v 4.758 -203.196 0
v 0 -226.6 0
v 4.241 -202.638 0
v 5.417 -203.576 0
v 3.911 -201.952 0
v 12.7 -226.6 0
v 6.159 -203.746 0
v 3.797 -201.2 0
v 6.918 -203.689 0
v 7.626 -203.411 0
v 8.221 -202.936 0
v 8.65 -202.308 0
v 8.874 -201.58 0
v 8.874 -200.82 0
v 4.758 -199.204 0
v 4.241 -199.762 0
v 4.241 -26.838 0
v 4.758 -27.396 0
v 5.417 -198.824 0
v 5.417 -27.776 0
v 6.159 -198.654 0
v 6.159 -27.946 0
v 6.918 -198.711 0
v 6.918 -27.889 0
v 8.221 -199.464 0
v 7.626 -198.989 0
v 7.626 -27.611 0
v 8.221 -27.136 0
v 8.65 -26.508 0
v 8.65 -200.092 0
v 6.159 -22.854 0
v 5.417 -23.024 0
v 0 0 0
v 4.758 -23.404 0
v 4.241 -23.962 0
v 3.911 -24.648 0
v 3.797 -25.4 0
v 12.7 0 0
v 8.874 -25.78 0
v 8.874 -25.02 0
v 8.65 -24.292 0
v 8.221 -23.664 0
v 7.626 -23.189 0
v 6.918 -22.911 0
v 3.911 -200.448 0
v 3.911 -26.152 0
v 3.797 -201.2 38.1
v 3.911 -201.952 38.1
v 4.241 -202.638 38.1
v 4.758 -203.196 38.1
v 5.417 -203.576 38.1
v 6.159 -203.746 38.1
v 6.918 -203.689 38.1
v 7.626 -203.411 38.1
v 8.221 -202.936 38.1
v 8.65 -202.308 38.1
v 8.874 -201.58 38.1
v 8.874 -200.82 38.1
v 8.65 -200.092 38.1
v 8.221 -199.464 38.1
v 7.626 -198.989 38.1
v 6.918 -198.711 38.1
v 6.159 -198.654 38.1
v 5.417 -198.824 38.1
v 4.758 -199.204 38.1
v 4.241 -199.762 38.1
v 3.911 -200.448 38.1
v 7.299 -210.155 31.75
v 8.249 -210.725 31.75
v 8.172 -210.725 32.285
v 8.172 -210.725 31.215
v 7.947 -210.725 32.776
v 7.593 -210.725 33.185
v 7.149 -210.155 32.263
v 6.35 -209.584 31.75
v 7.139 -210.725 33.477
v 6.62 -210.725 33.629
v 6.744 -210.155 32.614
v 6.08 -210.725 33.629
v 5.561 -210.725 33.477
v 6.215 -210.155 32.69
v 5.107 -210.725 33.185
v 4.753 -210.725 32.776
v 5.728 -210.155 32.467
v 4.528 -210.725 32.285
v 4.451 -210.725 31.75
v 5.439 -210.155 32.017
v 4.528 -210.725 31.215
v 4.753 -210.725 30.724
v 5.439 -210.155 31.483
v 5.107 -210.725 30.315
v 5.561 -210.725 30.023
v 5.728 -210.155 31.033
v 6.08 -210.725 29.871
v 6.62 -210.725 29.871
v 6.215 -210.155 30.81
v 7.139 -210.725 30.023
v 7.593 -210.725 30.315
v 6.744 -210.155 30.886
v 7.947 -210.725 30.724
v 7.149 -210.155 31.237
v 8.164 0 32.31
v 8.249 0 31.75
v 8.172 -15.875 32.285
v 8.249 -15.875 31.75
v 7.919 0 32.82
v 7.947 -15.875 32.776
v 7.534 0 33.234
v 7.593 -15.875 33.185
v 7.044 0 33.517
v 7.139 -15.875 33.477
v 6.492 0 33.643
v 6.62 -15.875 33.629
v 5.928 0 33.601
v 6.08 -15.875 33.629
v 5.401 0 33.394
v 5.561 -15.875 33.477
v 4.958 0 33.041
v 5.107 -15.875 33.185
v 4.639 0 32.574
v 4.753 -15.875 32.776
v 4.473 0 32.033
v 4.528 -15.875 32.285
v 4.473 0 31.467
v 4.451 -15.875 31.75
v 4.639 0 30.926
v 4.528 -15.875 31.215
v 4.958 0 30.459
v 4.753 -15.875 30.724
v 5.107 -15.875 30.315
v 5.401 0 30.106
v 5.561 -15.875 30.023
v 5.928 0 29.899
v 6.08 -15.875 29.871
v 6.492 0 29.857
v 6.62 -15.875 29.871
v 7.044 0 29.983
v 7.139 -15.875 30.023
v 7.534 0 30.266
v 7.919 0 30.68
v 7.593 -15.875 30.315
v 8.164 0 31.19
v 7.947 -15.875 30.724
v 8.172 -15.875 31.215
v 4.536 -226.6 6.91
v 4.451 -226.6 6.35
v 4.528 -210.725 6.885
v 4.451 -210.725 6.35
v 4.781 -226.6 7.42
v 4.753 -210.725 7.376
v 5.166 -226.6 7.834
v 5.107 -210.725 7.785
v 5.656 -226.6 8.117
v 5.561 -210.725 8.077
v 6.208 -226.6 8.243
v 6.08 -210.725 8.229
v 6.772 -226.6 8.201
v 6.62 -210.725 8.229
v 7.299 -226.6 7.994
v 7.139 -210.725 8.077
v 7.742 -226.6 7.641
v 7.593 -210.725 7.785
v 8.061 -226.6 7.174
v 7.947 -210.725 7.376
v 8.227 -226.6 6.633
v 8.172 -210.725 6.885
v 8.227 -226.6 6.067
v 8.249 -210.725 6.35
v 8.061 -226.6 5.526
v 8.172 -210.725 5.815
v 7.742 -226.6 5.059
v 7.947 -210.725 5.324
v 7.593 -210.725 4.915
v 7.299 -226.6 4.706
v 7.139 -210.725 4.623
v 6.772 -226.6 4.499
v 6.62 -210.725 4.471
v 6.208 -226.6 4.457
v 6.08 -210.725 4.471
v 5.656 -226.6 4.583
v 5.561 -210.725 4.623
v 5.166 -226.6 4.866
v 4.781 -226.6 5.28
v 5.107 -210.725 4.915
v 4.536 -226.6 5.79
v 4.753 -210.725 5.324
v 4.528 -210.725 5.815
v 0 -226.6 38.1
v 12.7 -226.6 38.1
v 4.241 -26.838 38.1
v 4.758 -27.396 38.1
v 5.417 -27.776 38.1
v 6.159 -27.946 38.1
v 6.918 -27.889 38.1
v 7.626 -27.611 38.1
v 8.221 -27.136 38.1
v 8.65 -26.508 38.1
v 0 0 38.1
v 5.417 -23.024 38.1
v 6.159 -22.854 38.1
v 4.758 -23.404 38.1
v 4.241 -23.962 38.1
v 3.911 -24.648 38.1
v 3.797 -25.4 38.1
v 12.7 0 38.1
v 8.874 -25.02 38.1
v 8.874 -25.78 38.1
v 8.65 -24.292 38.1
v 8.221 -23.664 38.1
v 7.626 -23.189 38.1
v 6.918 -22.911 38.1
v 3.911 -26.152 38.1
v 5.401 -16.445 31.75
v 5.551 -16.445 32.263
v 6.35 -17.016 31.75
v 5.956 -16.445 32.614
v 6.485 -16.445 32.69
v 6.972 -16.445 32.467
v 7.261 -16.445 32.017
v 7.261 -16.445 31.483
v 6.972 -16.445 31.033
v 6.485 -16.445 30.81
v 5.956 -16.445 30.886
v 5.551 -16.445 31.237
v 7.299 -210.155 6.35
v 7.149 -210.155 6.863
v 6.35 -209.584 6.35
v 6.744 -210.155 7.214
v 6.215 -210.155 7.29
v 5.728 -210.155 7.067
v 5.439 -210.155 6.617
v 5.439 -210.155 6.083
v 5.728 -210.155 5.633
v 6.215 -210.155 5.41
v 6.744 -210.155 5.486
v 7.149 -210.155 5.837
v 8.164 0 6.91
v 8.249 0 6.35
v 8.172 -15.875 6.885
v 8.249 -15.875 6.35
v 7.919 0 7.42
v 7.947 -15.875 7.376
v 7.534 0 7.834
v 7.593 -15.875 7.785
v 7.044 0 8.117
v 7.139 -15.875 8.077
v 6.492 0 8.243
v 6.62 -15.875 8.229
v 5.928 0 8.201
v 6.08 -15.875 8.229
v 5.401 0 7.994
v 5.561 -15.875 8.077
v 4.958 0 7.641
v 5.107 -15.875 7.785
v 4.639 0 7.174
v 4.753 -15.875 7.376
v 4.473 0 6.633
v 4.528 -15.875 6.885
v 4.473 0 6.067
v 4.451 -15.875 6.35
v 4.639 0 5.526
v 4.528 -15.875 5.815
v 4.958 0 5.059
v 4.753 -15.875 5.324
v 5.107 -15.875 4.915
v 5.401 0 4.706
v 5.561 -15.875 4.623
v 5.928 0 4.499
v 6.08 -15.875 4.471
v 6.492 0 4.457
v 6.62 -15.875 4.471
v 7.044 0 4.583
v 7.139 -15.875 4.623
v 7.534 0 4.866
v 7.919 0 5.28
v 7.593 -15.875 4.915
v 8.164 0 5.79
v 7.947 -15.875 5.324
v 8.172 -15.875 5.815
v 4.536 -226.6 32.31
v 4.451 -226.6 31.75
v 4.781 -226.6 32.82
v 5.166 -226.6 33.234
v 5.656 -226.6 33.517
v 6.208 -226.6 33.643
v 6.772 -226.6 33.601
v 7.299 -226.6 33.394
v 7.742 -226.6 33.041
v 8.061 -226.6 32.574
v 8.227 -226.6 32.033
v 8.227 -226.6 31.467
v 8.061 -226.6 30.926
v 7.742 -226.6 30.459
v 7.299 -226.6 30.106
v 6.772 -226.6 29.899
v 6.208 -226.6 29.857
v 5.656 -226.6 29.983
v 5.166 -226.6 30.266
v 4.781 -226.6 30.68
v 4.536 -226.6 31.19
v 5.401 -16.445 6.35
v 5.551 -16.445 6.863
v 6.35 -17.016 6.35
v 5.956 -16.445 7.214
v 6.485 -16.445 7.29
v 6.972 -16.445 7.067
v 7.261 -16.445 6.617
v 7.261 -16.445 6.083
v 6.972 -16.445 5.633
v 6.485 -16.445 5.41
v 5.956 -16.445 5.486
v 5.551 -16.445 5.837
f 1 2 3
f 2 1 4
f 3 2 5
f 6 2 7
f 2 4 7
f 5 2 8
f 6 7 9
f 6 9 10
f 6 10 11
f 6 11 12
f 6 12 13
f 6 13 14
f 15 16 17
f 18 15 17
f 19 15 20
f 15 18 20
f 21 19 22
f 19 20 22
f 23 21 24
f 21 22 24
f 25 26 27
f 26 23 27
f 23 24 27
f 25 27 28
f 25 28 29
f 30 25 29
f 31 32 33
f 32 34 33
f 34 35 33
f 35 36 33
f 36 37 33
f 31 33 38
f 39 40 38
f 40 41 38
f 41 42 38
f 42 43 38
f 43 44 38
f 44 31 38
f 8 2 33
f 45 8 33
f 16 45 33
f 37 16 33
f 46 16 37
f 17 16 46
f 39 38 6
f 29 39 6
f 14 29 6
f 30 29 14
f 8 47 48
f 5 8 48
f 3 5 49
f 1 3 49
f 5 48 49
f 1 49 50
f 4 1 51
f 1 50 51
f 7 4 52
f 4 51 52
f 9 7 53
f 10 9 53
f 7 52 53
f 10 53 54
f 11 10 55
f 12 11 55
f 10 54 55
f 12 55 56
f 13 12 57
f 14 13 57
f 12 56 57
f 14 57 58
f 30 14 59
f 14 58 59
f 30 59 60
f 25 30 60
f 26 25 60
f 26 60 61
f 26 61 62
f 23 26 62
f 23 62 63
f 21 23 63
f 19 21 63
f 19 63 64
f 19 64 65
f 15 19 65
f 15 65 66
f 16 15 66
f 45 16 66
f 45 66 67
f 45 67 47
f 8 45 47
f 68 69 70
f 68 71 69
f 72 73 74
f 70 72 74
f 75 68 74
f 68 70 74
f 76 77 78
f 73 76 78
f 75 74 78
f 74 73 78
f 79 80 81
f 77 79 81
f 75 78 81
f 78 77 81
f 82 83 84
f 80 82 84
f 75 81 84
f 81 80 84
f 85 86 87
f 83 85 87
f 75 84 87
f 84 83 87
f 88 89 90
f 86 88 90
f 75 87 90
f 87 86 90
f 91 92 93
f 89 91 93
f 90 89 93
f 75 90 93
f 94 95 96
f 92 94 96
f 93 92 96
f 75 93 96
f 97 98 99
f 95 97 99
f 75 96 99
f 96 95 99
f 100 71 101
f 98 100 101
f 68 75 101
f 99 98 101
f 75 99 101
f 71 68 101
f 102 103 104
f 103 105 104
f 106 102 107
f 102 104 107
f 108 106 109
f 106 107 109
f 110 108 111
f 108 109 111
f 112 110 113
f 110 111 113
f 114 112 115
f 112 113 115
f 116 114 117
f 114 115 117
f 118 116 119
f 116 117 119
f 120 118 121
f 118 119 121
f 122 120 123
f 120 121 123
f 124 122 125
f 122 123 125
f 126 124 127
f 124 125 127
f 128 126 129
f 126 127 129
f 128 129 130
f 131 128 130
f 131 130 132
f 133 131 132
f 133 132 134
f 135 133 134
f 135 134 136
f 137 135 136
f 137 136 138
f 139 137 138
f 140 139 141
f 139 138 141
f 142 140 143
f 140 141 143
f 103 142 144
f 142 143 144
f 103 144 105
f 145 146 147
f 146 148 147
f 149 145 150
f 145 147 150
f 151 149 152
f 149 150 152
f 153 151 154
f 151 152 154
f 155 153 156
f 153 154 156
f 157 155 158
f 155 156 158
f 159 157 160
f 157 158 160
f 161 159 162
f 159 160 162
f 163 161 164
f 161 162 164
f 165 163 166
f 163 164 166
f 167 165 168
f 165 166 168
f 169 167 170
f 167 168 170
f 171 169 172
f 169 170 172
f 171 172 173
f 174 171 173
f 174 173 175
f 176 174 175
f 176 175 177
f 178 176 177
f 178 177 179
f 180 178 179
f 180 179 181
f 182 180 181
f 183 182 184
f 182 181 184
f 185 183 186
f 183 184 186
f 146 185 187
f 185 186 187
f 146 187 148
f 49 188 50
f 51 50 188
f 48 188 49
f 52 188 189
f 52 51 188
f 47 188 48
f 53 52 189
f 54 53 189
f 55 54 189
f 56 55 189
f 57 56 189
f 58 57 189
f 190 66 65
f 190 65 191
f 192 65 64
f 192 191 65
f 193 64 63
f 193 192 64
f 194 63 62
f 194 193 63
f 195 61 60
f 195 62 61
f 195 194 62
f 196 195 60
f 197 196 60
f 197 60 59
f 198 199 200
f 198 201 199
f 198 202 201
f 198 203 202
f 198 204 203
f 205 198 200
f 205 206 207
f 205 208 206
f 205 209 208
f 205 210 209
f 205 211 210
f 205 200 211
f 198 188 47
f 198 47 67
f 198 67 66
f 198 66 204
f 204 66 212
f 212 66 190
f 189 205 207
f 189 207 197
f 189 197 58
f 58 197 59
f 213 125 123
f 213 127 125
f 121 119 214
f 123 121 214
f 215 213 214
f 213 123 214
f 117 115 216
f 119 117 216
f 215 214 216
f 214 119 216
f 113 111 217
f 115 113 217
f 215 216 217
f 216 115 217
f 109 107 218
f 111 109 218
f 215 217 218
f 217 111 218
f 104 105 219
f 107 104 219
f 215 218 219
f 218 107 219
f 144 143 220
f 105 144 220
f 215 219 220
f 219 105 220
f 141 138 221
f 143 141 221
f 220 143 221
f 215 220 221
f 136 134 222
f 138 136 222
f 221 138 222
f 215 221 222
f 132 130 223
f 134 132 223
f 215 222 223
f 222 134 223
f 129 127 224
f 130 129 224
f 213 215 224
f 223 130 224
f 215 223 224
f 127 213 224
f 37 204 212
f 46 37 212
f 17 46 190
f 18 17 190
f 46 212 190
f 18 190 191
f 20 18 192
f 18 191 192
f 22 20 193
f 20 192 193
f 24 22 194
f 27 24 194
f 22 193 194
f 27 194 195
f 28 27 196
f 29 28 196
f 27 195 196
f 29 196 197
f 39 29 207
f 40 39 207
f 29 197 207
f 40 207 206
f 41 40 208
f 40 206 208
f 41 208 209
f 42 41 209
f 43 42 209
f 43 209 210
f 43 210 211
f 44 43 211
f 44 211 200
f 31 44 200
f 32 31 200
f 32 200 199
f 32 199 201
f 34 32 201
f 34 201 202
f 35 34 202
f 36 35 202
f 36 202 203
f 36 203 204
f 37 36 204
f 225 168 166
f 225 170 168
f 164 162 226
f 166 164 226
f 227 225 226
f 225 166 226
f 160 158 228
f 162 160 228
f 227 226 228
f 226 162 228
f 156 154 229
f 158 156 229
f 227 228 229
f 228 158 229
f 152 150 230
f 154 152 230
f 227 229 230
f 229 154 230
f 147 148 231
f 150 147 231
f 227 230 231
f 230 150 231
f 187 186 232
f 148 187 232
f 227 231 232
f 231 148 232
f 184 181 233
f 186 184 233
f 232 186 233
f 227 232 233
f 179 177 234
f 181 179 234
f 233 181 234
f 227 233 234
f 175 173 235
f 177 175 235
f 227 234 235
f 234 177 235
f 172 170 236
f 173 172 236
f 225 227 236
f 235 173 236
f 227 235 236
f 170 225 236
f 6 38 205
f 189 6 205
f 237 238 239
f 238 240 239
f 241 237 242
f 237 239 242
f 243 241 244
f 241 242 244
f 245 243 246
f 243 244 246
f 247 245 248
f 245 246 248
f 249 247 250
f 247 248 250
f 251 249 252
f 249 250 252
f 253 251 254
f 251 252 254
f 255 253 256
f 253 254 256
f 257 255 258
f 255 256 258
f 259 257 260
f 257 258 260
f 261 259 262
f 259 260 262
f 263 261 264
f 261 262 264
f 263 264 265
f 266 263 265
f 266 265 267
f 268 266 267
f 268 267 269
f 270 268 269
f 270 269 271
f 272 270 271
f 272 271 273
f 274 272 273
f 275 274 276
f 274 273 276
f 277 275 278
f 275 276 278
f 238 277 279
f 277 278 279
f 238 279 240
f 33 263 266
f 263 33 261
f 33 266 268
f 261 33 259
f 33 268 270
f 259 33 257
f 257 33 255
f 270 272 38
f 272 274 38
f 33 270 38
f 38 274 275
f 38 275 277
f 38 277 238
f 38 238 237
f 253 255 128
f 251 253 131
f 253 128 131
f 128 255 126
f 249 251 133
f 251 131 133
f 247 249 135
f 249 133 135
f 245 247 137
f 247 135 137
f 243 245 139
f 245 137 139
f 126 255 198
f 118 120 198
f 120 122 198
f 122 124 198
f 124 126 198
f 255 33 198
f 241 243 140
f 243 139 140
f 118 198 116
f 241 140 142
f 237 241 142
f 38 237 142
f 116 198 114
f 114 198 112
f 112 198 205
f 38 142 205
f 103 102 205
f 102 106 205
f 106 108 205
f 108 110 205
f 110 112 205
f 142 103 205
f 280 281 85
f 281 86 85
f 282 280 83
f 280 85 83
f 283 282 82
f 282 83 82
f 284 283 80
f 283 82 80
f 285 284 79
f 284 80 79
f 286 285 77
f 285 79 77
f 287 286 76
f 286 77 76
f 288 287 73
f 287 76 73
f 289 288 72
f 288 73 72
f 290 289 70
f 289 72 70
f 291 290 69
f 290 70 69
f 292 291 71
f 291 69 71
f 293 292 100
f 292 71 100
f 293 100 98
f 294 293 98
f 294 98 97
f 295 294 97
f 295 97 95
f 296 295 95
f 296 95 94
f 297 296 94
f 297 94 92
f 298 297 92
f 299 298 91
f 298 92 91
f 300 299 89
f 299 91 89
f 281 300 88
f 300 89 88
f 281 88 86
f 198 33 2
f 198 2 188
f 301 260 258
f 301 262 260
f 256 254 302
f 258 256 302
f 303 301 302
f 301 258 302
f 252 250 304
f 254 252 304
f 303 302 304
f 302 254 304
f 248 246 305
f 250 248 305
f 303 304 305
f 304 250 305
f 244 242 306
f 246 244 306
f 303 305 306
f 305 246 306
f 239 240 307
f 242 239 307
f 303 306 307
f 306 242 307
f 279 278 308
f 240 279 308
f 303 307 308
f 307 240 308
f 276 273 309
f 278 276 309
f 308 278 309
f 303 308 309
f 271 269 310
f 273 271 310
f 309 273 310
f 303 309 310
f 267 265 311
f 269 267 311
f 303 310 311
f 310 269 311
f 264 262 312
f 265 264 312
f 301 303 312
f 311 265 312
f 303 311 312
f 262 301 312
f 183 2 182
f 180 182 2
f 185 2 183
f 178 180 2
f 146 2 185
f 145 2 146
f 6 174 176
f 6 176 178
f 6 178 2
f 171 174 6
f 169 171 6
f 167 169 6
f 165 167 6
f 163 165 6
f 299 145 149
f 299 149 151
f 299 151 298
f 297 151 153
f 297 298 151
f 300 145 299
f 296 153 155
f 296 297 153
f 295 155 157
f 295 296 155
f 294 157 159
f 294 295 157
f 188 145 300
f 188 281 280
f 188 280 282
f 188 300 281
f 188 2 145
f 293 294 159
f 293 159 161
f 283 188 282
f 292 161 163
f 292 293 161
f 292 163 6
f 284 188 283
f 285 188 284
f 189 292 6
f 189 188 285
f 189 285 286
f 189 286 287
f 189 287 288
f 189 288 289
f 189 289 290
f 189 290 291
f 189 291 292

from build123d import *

# Parameters (mm, degrees)
F0_W     = 12.7
F0_H     = 38.1
F1_DEPTH = 226.6
F3_D     = 3.7973
F3_DEPTH = 15.875
F3_TIP   = 1.1408240143
F5_D     = 3.7973
F5_DEPTH = 15.875
F5_TIP   = 1.1408240143
F7_D     = 5.1054


with BuildPart() as f1:
    # F0 (on Front) → F1 (new body)
    with BuildSketch(Plane.XZ):
        with Locations((6.35, 19.05)):
            Rectangle(F0_W, F0_H)
    extrude(amount=F1_DEPTH)

    # F3
    with Locations(Plane.XZ.offset(226.6)):
        with Locations((6.35, 31.75), (6.35, 6.35)):
            Hole(F3_D / 2, depth=F3_DEPTH)
            with Locations((0, 0, -(F3_DEPTH + F3_TIP / 2))):  # 118° drill point
                Cone(0, F3_D / 2, F3_TIP, mode=Mode.SUBTRACT)

    # F5
    with Locations(Plane(origin=(0, 0, 0), x_dir=(-1, 0, 0), z_dir=(0, 1, 0))):
        with Locations((-6.35, 31.75), (-6.35, 6.35)):
            Hole(F5_D / 2, depth=F5_DEPTH)
            with Locations((0, 0, -(F5_DEPTH + F5_TIP / 2))):  # 118° drill point
                Cone(0, F5_D / 2, F5_TIP, mode=Mode.SUBTRACT)

    # F7 (through all)
    with Locations(Plane(origin=(0, 0, 0), x_dir=(1, 0, 0), z_dir=(0, 0, -1))):
        with Locations((6.35, 25.4), (6.35, 201.2)):
            Hole(F7_D / 2)


solid = f1.part
